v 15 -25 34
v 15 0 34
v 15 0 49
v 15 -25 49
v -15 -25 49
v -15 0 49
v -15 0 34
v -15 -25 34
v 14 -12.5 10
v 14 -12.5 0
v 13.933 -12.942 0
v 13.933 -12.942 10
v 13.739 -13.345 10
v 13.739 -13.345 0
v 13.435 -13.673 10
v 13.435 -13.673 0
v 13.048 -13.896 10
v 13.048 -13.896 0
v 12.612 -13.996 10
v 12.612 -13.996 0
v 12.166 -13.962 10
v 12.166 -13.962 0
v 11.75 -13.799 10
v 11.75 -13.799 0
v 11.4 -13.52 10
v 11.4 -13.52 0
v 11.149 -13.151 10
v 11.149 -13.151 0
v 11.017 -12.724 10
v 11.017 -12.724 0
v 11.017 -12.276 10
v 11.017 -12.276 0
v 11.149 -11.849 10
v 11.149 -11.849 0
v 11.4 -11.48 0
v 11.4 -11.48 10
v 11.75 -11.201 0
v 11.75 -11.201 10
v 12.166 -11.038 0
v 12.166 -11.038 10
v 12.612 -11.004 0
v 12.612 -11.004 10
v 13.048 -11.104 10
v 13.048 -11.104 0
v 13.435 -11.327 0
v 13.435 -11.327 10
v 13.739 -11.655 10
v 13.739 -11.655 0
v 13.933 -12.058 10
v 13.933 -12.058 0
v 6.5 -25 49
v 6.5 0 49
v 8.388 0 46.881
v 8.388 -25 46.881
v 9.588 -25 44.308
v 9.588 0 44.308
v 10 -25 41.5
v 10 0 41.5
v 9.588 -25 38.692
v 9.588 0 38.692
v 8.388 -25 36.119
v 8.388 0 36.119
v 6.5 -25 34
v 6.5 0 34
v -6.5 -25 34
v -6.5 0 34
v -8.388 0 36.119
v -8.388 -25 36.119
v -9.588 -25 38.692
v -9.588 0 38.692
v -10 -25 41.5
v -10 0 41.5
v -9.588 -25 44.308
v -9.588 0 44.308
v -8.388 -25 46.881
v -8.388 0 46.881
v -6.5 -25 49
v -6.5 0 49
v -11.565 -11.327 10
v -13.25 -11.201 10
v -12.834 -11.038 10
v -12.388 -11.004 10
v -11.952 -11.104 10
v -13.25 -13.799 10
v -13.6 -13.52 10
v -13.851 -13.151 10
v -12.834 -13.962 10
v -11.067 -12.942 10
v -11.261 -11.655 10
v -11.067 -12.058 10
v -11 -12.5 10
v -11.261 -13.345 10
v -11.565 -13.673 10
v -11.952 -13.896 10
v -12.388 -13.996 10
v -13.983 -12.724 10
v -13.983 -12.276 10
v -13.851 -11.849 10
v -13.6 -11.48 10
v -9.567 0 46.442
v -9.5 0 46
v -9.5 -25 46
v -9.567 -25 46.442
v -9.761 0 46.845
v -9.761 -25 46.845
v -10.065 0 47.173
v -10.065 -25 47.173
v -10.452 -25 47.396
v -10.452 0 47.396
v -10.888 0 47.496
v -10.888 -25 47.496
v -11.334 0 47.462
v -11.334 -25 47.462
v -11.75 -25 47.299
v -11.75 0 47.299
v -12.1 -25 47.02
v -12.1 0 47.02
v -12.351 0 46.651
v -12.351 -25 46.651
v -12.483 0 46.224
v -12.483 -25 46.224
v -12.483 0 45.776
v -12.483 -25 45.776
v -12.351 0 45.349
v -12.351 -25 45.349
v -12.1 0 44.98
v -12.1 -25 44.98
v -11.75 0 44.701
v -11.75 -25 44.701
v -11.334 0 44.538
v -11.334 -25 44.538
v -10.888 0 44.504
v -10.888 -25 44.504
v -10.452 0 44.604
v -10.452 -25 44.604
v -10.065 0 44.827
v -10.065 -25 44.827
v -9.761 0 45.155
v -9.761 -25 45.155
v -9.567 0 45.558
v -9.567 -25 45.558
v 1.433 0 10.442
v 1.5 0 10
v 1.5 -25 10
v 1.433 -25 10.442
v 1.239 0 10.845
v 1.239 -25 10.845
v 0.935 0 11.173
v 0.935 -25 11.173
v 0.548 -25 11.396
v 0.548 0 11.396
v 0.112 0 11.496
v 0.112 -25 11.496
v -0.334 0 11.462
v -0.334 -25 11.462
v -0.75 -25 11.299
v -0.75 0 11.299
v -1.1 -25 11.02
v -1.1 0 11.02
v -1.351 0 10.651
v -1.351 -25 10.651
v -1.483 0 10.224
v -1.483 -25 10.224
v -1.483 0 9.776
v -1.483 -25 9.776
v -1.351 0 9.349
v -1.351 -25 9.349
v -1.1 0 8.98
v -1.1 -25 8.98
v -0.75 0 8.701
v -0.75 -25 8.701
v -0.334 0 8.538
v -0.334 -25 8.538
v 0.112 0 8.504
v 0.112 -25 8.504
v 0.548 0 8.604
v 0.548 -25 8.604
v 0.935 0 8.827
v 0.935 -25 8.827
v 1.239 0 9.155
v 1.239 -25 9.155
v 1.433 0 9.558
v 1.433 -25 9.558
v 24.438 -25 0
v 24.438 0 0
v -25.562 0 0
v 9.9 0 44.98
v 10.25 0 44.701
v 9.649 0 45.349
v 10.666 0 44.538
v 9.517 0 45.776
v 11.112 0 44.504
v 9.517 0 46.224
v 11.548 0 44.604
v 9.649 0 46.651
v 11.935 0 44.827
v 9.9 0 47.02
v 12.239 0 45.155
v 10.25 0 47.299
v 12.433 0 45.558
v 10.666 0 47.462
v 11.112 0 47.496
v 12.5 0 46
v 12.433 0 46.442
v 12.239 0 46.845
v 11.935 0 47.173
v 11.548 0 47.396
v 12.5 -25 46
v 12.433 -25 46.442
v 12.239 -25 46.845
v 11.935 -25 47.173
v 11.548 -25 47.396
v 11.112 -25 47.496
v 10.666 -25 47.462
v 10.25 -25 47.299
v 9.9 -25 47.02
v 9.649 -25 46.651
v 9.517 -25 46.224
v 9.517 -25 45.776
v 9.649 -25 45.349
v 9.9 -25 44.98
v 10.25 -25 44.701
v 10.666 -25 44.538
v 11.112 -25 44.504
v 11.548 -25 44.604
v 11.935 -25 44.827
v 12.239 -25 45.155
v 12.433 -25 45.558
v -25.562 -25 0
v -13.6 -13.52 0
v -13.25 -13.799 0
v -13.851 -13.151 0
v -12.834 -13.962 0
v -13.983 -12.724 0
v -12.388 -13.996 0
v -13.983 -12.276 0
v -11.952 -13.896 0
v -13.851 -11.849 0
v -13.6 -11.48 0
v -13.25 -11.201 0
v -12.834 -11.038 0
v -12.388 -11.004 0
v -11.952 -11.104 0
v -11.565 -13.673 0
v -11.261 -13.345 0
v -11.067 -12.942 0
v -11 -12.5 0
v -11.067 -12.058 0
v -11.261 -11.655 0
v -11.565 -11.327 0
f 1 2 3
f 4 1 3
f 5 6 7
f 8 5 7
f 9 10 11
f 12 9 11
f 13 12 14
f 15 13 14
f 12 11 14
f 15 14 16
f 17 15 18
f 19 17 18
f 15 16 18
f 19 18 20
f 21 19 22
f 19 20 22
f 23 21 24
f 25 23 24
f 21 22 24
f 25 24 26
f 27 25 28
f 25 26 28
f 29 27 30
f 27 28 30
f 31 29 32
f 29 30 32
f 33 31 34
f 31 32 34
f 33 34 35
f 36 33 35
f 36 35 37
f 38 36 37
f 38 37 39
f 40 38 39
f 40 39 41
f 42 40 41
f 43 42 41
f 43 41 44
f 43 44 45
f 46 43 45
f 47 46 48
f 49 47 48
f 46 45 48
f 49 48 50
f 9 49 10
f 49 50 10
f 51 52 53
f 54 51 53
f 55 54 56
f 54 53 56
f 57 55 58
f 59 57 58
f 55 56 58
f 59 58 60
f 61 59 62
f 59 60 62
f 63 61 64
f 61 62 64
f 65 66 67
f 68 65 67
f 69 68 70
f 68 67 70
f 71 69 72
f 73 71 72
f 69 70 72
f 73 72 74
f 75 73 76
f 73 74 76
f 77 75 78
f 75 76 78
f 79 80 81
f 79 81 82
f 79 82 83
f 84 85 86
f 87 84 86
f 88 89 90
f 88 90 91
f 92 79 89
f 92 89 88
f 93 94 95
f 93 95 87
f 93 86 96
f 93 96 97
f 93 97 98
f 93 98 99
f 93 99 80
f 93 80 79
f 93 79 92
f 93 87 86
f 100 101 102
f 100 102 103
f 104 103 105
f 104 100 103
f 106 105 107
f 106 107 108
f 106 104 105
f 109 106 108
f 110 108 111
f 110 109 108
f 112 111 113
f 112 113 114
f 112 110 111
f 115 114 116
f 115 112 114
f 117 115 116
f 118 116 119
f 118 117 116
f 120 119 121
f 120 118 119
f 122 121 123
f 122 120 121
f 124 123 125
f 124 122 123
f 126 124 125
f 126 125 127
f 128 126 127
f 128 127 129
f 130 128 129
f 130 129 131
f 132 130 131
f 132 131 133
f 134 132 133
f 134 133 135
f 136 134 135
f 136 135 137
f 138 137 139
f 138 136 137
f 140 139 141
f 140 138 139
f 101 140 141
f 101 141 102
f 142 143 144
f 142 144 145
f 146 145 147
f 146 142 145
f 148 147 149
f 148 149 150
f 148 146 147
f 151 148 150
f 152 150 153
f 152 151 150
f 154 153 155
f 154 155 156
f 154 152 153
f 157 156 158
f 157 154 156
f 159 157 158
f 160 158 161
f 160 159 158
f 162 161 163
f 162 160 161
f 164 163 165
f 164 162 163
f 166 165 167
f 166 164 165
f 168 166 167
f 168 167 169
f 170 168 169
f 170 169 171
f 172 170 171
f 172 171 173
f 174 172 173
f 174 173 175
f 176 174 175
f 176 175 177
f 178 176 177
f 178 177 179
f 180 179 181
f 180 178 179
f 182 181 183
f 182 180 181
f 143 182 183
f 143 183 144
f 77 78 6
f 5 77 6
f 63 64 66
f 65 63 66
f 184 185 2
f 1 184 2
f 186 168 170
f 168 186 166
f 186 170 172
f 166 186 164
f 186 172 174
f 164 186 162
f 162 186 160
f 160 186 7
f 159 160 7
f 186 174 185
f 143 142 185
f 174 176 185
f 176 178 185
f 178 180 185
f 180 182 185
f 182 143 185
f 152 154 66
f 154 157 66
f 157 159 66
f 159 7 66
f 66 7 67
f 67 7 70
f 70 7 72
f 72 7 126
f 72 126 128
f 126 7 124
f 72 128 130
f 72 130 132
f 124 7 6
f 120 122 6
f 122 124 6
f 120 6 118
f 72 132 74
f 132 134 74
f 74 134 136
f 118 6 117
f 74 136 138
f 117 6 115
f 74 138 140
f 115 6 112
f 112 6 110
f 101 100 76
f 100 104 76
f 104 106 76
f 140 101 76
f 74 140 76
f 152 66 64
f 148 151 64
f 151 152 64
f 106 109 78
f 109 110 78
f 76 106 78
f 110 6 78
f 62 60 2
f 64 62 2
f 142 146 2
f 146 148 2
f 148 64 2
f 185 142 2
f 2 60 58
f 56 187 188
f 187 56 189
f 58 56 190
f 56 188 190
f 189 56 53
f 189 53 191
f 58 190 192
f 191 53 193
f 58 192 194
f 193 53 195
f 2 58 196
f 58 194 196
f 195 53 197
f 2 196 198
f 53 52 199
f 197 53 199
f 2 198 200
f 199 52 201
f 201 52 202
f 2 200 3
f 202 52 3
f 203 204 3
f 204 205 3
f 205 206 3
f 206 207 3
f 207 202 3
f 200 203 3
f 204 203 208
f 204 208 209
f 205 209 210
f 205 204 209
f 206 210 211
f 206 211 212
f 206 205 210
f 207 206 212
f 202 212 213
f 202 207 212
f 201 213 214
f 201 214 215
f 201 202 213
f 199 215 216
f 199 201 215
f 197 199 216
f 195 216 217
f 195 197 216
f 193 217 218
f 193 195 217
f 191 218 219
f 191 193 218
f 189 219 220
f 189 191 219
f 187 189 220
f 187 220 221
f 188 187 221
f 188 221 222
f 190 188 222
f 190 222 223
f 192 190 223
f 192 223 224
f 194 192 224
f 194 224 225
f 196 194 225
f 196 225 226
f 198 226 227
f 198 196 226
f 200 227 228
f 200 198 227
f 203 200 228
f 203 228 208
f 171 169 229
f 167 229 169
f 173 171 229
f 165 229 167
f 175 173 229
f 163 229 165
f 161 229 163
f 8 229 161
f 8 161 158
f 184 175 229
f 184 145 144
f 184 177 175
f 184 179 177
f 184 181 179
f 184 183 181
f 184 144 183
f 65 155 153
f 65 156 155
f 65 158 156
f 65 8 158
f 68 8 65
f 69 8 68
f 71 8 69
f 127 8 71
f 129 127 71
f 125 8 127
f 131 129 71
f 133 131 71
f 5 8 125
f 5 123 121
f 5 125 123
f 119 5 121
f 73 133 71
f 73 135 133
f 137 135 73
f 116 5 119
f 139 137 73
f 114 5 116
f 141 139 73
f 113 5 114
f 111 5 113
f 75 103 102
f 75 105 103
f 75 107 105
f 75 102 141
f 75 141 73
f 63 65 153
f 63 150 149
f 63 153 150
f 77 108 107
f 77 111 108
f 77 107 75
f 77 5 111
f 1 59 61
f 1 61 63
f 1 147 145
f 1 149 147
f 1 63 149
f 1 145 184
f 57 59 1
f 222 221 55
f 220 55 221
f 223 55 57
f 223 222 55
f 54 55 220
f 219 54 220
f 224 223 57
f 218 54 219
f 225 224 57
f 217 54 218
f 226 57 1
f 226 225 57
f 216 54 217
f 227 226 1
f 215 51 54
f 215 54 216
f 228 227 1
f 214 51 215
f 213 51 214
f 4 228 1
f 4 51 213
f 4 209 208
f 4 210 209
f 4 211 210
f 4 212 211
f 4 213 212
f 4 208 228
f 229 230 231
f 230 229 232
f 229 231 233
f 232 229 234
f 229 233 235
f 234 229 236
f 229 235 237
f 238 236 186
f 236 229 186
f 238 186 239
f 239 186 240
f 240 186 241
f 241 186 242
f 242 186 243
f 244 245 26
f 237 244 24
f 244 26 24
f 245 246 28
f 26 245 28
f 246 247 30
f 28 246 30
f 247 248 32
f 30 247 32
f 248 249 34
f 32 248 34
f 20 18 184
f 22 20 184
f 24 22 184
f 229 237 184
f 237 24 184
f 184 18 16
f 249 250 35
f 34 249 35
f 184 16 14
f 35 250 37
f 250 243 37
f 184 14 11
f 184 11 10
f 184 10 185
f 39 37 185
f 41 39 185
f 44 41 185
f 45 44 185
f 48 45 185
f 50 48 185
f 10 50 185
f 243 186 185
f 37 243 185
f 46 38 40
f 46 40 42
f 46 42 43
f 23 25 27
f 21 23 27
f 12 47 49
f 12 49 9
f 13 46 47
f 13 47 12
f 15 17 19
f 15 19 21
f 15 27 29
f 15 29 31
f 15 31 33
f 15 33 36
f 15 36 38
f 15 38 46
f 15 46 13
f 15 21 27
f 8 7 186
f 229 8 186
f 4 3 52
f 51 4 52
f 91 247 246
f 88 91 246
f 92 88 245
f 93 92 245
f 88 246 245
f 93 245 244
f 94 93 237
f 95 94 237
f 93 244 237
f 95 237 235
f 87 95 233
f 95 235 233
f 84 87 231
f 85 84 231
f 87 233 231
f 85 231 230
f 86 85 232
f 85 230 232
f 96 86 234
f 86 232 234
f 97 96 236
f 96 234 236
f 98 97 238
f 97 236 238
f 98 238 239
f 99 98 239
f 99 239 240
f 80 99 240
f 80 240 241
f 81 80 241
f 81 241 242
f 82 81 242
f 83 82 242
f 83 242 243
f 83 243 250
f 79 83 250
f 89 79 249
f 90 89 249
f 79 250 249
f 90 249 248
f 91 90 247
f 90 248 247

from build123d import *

# Parameters (mm, degrees)
F0_R     = 1.5
F1_DEPTH = 25
F2_R     = 1.5
F3_DEPTH = 10


with BuildPart() as f1:
    # F0 (on Front) → F1 (new body)
    with BuildSketch(Plane.XZ):
        with BuildLine():
            Line((6.5, 34), (15, 34))
            Line((15, 34), (15, 49))
            Line((15, 49), (6.5, 49))
            ThreePointArc((6.5, 49), (10, 41.5), (6.5, 34))
        make_face()
        with Locations((11, 46)):
            Circle(F0_R, mode=Mode.SUBTRACT)
        with BuildLine():
            Line((-15, 49), (-15, 34))
            Line((-15, 34), (-6.5, 34))
            ThreePointArc((-6.5, 34), (-10, 41.5), (-6.5, 49))
            Line((-6.5, 49), (-15, 49))
        make_face()
        with Locations((-11, 46)):
            Circle(F0_R, mode=Mode.SUBTRACT)
        Polygon((-15, 34), (-25.561607, 0), (24.438393, 0), (15, 34), (6.5, 34), (-6.5, 34), align=None)
        with Locations((0, 10)):
            Circle(F0_R, mode=Mode.SUBTRACT)
    extrude(amount=F1_DEPTH)

    # F2 (on face) → F3 (cut)
    with BuildSketch(Plane(origin=(0, 0, 0), x_dir=(1, 0, 0), z_dir=(0, 0, -1))):
        with Locations((-12.5, 12.5)):
            Circle(F2_R)
        with Locations((12.5, 12.5)):
            Circle(F2_R)
    extrude(amount=-F3_DEPTH, mode=Mode.SUBTRACT)


solid = f1.part
